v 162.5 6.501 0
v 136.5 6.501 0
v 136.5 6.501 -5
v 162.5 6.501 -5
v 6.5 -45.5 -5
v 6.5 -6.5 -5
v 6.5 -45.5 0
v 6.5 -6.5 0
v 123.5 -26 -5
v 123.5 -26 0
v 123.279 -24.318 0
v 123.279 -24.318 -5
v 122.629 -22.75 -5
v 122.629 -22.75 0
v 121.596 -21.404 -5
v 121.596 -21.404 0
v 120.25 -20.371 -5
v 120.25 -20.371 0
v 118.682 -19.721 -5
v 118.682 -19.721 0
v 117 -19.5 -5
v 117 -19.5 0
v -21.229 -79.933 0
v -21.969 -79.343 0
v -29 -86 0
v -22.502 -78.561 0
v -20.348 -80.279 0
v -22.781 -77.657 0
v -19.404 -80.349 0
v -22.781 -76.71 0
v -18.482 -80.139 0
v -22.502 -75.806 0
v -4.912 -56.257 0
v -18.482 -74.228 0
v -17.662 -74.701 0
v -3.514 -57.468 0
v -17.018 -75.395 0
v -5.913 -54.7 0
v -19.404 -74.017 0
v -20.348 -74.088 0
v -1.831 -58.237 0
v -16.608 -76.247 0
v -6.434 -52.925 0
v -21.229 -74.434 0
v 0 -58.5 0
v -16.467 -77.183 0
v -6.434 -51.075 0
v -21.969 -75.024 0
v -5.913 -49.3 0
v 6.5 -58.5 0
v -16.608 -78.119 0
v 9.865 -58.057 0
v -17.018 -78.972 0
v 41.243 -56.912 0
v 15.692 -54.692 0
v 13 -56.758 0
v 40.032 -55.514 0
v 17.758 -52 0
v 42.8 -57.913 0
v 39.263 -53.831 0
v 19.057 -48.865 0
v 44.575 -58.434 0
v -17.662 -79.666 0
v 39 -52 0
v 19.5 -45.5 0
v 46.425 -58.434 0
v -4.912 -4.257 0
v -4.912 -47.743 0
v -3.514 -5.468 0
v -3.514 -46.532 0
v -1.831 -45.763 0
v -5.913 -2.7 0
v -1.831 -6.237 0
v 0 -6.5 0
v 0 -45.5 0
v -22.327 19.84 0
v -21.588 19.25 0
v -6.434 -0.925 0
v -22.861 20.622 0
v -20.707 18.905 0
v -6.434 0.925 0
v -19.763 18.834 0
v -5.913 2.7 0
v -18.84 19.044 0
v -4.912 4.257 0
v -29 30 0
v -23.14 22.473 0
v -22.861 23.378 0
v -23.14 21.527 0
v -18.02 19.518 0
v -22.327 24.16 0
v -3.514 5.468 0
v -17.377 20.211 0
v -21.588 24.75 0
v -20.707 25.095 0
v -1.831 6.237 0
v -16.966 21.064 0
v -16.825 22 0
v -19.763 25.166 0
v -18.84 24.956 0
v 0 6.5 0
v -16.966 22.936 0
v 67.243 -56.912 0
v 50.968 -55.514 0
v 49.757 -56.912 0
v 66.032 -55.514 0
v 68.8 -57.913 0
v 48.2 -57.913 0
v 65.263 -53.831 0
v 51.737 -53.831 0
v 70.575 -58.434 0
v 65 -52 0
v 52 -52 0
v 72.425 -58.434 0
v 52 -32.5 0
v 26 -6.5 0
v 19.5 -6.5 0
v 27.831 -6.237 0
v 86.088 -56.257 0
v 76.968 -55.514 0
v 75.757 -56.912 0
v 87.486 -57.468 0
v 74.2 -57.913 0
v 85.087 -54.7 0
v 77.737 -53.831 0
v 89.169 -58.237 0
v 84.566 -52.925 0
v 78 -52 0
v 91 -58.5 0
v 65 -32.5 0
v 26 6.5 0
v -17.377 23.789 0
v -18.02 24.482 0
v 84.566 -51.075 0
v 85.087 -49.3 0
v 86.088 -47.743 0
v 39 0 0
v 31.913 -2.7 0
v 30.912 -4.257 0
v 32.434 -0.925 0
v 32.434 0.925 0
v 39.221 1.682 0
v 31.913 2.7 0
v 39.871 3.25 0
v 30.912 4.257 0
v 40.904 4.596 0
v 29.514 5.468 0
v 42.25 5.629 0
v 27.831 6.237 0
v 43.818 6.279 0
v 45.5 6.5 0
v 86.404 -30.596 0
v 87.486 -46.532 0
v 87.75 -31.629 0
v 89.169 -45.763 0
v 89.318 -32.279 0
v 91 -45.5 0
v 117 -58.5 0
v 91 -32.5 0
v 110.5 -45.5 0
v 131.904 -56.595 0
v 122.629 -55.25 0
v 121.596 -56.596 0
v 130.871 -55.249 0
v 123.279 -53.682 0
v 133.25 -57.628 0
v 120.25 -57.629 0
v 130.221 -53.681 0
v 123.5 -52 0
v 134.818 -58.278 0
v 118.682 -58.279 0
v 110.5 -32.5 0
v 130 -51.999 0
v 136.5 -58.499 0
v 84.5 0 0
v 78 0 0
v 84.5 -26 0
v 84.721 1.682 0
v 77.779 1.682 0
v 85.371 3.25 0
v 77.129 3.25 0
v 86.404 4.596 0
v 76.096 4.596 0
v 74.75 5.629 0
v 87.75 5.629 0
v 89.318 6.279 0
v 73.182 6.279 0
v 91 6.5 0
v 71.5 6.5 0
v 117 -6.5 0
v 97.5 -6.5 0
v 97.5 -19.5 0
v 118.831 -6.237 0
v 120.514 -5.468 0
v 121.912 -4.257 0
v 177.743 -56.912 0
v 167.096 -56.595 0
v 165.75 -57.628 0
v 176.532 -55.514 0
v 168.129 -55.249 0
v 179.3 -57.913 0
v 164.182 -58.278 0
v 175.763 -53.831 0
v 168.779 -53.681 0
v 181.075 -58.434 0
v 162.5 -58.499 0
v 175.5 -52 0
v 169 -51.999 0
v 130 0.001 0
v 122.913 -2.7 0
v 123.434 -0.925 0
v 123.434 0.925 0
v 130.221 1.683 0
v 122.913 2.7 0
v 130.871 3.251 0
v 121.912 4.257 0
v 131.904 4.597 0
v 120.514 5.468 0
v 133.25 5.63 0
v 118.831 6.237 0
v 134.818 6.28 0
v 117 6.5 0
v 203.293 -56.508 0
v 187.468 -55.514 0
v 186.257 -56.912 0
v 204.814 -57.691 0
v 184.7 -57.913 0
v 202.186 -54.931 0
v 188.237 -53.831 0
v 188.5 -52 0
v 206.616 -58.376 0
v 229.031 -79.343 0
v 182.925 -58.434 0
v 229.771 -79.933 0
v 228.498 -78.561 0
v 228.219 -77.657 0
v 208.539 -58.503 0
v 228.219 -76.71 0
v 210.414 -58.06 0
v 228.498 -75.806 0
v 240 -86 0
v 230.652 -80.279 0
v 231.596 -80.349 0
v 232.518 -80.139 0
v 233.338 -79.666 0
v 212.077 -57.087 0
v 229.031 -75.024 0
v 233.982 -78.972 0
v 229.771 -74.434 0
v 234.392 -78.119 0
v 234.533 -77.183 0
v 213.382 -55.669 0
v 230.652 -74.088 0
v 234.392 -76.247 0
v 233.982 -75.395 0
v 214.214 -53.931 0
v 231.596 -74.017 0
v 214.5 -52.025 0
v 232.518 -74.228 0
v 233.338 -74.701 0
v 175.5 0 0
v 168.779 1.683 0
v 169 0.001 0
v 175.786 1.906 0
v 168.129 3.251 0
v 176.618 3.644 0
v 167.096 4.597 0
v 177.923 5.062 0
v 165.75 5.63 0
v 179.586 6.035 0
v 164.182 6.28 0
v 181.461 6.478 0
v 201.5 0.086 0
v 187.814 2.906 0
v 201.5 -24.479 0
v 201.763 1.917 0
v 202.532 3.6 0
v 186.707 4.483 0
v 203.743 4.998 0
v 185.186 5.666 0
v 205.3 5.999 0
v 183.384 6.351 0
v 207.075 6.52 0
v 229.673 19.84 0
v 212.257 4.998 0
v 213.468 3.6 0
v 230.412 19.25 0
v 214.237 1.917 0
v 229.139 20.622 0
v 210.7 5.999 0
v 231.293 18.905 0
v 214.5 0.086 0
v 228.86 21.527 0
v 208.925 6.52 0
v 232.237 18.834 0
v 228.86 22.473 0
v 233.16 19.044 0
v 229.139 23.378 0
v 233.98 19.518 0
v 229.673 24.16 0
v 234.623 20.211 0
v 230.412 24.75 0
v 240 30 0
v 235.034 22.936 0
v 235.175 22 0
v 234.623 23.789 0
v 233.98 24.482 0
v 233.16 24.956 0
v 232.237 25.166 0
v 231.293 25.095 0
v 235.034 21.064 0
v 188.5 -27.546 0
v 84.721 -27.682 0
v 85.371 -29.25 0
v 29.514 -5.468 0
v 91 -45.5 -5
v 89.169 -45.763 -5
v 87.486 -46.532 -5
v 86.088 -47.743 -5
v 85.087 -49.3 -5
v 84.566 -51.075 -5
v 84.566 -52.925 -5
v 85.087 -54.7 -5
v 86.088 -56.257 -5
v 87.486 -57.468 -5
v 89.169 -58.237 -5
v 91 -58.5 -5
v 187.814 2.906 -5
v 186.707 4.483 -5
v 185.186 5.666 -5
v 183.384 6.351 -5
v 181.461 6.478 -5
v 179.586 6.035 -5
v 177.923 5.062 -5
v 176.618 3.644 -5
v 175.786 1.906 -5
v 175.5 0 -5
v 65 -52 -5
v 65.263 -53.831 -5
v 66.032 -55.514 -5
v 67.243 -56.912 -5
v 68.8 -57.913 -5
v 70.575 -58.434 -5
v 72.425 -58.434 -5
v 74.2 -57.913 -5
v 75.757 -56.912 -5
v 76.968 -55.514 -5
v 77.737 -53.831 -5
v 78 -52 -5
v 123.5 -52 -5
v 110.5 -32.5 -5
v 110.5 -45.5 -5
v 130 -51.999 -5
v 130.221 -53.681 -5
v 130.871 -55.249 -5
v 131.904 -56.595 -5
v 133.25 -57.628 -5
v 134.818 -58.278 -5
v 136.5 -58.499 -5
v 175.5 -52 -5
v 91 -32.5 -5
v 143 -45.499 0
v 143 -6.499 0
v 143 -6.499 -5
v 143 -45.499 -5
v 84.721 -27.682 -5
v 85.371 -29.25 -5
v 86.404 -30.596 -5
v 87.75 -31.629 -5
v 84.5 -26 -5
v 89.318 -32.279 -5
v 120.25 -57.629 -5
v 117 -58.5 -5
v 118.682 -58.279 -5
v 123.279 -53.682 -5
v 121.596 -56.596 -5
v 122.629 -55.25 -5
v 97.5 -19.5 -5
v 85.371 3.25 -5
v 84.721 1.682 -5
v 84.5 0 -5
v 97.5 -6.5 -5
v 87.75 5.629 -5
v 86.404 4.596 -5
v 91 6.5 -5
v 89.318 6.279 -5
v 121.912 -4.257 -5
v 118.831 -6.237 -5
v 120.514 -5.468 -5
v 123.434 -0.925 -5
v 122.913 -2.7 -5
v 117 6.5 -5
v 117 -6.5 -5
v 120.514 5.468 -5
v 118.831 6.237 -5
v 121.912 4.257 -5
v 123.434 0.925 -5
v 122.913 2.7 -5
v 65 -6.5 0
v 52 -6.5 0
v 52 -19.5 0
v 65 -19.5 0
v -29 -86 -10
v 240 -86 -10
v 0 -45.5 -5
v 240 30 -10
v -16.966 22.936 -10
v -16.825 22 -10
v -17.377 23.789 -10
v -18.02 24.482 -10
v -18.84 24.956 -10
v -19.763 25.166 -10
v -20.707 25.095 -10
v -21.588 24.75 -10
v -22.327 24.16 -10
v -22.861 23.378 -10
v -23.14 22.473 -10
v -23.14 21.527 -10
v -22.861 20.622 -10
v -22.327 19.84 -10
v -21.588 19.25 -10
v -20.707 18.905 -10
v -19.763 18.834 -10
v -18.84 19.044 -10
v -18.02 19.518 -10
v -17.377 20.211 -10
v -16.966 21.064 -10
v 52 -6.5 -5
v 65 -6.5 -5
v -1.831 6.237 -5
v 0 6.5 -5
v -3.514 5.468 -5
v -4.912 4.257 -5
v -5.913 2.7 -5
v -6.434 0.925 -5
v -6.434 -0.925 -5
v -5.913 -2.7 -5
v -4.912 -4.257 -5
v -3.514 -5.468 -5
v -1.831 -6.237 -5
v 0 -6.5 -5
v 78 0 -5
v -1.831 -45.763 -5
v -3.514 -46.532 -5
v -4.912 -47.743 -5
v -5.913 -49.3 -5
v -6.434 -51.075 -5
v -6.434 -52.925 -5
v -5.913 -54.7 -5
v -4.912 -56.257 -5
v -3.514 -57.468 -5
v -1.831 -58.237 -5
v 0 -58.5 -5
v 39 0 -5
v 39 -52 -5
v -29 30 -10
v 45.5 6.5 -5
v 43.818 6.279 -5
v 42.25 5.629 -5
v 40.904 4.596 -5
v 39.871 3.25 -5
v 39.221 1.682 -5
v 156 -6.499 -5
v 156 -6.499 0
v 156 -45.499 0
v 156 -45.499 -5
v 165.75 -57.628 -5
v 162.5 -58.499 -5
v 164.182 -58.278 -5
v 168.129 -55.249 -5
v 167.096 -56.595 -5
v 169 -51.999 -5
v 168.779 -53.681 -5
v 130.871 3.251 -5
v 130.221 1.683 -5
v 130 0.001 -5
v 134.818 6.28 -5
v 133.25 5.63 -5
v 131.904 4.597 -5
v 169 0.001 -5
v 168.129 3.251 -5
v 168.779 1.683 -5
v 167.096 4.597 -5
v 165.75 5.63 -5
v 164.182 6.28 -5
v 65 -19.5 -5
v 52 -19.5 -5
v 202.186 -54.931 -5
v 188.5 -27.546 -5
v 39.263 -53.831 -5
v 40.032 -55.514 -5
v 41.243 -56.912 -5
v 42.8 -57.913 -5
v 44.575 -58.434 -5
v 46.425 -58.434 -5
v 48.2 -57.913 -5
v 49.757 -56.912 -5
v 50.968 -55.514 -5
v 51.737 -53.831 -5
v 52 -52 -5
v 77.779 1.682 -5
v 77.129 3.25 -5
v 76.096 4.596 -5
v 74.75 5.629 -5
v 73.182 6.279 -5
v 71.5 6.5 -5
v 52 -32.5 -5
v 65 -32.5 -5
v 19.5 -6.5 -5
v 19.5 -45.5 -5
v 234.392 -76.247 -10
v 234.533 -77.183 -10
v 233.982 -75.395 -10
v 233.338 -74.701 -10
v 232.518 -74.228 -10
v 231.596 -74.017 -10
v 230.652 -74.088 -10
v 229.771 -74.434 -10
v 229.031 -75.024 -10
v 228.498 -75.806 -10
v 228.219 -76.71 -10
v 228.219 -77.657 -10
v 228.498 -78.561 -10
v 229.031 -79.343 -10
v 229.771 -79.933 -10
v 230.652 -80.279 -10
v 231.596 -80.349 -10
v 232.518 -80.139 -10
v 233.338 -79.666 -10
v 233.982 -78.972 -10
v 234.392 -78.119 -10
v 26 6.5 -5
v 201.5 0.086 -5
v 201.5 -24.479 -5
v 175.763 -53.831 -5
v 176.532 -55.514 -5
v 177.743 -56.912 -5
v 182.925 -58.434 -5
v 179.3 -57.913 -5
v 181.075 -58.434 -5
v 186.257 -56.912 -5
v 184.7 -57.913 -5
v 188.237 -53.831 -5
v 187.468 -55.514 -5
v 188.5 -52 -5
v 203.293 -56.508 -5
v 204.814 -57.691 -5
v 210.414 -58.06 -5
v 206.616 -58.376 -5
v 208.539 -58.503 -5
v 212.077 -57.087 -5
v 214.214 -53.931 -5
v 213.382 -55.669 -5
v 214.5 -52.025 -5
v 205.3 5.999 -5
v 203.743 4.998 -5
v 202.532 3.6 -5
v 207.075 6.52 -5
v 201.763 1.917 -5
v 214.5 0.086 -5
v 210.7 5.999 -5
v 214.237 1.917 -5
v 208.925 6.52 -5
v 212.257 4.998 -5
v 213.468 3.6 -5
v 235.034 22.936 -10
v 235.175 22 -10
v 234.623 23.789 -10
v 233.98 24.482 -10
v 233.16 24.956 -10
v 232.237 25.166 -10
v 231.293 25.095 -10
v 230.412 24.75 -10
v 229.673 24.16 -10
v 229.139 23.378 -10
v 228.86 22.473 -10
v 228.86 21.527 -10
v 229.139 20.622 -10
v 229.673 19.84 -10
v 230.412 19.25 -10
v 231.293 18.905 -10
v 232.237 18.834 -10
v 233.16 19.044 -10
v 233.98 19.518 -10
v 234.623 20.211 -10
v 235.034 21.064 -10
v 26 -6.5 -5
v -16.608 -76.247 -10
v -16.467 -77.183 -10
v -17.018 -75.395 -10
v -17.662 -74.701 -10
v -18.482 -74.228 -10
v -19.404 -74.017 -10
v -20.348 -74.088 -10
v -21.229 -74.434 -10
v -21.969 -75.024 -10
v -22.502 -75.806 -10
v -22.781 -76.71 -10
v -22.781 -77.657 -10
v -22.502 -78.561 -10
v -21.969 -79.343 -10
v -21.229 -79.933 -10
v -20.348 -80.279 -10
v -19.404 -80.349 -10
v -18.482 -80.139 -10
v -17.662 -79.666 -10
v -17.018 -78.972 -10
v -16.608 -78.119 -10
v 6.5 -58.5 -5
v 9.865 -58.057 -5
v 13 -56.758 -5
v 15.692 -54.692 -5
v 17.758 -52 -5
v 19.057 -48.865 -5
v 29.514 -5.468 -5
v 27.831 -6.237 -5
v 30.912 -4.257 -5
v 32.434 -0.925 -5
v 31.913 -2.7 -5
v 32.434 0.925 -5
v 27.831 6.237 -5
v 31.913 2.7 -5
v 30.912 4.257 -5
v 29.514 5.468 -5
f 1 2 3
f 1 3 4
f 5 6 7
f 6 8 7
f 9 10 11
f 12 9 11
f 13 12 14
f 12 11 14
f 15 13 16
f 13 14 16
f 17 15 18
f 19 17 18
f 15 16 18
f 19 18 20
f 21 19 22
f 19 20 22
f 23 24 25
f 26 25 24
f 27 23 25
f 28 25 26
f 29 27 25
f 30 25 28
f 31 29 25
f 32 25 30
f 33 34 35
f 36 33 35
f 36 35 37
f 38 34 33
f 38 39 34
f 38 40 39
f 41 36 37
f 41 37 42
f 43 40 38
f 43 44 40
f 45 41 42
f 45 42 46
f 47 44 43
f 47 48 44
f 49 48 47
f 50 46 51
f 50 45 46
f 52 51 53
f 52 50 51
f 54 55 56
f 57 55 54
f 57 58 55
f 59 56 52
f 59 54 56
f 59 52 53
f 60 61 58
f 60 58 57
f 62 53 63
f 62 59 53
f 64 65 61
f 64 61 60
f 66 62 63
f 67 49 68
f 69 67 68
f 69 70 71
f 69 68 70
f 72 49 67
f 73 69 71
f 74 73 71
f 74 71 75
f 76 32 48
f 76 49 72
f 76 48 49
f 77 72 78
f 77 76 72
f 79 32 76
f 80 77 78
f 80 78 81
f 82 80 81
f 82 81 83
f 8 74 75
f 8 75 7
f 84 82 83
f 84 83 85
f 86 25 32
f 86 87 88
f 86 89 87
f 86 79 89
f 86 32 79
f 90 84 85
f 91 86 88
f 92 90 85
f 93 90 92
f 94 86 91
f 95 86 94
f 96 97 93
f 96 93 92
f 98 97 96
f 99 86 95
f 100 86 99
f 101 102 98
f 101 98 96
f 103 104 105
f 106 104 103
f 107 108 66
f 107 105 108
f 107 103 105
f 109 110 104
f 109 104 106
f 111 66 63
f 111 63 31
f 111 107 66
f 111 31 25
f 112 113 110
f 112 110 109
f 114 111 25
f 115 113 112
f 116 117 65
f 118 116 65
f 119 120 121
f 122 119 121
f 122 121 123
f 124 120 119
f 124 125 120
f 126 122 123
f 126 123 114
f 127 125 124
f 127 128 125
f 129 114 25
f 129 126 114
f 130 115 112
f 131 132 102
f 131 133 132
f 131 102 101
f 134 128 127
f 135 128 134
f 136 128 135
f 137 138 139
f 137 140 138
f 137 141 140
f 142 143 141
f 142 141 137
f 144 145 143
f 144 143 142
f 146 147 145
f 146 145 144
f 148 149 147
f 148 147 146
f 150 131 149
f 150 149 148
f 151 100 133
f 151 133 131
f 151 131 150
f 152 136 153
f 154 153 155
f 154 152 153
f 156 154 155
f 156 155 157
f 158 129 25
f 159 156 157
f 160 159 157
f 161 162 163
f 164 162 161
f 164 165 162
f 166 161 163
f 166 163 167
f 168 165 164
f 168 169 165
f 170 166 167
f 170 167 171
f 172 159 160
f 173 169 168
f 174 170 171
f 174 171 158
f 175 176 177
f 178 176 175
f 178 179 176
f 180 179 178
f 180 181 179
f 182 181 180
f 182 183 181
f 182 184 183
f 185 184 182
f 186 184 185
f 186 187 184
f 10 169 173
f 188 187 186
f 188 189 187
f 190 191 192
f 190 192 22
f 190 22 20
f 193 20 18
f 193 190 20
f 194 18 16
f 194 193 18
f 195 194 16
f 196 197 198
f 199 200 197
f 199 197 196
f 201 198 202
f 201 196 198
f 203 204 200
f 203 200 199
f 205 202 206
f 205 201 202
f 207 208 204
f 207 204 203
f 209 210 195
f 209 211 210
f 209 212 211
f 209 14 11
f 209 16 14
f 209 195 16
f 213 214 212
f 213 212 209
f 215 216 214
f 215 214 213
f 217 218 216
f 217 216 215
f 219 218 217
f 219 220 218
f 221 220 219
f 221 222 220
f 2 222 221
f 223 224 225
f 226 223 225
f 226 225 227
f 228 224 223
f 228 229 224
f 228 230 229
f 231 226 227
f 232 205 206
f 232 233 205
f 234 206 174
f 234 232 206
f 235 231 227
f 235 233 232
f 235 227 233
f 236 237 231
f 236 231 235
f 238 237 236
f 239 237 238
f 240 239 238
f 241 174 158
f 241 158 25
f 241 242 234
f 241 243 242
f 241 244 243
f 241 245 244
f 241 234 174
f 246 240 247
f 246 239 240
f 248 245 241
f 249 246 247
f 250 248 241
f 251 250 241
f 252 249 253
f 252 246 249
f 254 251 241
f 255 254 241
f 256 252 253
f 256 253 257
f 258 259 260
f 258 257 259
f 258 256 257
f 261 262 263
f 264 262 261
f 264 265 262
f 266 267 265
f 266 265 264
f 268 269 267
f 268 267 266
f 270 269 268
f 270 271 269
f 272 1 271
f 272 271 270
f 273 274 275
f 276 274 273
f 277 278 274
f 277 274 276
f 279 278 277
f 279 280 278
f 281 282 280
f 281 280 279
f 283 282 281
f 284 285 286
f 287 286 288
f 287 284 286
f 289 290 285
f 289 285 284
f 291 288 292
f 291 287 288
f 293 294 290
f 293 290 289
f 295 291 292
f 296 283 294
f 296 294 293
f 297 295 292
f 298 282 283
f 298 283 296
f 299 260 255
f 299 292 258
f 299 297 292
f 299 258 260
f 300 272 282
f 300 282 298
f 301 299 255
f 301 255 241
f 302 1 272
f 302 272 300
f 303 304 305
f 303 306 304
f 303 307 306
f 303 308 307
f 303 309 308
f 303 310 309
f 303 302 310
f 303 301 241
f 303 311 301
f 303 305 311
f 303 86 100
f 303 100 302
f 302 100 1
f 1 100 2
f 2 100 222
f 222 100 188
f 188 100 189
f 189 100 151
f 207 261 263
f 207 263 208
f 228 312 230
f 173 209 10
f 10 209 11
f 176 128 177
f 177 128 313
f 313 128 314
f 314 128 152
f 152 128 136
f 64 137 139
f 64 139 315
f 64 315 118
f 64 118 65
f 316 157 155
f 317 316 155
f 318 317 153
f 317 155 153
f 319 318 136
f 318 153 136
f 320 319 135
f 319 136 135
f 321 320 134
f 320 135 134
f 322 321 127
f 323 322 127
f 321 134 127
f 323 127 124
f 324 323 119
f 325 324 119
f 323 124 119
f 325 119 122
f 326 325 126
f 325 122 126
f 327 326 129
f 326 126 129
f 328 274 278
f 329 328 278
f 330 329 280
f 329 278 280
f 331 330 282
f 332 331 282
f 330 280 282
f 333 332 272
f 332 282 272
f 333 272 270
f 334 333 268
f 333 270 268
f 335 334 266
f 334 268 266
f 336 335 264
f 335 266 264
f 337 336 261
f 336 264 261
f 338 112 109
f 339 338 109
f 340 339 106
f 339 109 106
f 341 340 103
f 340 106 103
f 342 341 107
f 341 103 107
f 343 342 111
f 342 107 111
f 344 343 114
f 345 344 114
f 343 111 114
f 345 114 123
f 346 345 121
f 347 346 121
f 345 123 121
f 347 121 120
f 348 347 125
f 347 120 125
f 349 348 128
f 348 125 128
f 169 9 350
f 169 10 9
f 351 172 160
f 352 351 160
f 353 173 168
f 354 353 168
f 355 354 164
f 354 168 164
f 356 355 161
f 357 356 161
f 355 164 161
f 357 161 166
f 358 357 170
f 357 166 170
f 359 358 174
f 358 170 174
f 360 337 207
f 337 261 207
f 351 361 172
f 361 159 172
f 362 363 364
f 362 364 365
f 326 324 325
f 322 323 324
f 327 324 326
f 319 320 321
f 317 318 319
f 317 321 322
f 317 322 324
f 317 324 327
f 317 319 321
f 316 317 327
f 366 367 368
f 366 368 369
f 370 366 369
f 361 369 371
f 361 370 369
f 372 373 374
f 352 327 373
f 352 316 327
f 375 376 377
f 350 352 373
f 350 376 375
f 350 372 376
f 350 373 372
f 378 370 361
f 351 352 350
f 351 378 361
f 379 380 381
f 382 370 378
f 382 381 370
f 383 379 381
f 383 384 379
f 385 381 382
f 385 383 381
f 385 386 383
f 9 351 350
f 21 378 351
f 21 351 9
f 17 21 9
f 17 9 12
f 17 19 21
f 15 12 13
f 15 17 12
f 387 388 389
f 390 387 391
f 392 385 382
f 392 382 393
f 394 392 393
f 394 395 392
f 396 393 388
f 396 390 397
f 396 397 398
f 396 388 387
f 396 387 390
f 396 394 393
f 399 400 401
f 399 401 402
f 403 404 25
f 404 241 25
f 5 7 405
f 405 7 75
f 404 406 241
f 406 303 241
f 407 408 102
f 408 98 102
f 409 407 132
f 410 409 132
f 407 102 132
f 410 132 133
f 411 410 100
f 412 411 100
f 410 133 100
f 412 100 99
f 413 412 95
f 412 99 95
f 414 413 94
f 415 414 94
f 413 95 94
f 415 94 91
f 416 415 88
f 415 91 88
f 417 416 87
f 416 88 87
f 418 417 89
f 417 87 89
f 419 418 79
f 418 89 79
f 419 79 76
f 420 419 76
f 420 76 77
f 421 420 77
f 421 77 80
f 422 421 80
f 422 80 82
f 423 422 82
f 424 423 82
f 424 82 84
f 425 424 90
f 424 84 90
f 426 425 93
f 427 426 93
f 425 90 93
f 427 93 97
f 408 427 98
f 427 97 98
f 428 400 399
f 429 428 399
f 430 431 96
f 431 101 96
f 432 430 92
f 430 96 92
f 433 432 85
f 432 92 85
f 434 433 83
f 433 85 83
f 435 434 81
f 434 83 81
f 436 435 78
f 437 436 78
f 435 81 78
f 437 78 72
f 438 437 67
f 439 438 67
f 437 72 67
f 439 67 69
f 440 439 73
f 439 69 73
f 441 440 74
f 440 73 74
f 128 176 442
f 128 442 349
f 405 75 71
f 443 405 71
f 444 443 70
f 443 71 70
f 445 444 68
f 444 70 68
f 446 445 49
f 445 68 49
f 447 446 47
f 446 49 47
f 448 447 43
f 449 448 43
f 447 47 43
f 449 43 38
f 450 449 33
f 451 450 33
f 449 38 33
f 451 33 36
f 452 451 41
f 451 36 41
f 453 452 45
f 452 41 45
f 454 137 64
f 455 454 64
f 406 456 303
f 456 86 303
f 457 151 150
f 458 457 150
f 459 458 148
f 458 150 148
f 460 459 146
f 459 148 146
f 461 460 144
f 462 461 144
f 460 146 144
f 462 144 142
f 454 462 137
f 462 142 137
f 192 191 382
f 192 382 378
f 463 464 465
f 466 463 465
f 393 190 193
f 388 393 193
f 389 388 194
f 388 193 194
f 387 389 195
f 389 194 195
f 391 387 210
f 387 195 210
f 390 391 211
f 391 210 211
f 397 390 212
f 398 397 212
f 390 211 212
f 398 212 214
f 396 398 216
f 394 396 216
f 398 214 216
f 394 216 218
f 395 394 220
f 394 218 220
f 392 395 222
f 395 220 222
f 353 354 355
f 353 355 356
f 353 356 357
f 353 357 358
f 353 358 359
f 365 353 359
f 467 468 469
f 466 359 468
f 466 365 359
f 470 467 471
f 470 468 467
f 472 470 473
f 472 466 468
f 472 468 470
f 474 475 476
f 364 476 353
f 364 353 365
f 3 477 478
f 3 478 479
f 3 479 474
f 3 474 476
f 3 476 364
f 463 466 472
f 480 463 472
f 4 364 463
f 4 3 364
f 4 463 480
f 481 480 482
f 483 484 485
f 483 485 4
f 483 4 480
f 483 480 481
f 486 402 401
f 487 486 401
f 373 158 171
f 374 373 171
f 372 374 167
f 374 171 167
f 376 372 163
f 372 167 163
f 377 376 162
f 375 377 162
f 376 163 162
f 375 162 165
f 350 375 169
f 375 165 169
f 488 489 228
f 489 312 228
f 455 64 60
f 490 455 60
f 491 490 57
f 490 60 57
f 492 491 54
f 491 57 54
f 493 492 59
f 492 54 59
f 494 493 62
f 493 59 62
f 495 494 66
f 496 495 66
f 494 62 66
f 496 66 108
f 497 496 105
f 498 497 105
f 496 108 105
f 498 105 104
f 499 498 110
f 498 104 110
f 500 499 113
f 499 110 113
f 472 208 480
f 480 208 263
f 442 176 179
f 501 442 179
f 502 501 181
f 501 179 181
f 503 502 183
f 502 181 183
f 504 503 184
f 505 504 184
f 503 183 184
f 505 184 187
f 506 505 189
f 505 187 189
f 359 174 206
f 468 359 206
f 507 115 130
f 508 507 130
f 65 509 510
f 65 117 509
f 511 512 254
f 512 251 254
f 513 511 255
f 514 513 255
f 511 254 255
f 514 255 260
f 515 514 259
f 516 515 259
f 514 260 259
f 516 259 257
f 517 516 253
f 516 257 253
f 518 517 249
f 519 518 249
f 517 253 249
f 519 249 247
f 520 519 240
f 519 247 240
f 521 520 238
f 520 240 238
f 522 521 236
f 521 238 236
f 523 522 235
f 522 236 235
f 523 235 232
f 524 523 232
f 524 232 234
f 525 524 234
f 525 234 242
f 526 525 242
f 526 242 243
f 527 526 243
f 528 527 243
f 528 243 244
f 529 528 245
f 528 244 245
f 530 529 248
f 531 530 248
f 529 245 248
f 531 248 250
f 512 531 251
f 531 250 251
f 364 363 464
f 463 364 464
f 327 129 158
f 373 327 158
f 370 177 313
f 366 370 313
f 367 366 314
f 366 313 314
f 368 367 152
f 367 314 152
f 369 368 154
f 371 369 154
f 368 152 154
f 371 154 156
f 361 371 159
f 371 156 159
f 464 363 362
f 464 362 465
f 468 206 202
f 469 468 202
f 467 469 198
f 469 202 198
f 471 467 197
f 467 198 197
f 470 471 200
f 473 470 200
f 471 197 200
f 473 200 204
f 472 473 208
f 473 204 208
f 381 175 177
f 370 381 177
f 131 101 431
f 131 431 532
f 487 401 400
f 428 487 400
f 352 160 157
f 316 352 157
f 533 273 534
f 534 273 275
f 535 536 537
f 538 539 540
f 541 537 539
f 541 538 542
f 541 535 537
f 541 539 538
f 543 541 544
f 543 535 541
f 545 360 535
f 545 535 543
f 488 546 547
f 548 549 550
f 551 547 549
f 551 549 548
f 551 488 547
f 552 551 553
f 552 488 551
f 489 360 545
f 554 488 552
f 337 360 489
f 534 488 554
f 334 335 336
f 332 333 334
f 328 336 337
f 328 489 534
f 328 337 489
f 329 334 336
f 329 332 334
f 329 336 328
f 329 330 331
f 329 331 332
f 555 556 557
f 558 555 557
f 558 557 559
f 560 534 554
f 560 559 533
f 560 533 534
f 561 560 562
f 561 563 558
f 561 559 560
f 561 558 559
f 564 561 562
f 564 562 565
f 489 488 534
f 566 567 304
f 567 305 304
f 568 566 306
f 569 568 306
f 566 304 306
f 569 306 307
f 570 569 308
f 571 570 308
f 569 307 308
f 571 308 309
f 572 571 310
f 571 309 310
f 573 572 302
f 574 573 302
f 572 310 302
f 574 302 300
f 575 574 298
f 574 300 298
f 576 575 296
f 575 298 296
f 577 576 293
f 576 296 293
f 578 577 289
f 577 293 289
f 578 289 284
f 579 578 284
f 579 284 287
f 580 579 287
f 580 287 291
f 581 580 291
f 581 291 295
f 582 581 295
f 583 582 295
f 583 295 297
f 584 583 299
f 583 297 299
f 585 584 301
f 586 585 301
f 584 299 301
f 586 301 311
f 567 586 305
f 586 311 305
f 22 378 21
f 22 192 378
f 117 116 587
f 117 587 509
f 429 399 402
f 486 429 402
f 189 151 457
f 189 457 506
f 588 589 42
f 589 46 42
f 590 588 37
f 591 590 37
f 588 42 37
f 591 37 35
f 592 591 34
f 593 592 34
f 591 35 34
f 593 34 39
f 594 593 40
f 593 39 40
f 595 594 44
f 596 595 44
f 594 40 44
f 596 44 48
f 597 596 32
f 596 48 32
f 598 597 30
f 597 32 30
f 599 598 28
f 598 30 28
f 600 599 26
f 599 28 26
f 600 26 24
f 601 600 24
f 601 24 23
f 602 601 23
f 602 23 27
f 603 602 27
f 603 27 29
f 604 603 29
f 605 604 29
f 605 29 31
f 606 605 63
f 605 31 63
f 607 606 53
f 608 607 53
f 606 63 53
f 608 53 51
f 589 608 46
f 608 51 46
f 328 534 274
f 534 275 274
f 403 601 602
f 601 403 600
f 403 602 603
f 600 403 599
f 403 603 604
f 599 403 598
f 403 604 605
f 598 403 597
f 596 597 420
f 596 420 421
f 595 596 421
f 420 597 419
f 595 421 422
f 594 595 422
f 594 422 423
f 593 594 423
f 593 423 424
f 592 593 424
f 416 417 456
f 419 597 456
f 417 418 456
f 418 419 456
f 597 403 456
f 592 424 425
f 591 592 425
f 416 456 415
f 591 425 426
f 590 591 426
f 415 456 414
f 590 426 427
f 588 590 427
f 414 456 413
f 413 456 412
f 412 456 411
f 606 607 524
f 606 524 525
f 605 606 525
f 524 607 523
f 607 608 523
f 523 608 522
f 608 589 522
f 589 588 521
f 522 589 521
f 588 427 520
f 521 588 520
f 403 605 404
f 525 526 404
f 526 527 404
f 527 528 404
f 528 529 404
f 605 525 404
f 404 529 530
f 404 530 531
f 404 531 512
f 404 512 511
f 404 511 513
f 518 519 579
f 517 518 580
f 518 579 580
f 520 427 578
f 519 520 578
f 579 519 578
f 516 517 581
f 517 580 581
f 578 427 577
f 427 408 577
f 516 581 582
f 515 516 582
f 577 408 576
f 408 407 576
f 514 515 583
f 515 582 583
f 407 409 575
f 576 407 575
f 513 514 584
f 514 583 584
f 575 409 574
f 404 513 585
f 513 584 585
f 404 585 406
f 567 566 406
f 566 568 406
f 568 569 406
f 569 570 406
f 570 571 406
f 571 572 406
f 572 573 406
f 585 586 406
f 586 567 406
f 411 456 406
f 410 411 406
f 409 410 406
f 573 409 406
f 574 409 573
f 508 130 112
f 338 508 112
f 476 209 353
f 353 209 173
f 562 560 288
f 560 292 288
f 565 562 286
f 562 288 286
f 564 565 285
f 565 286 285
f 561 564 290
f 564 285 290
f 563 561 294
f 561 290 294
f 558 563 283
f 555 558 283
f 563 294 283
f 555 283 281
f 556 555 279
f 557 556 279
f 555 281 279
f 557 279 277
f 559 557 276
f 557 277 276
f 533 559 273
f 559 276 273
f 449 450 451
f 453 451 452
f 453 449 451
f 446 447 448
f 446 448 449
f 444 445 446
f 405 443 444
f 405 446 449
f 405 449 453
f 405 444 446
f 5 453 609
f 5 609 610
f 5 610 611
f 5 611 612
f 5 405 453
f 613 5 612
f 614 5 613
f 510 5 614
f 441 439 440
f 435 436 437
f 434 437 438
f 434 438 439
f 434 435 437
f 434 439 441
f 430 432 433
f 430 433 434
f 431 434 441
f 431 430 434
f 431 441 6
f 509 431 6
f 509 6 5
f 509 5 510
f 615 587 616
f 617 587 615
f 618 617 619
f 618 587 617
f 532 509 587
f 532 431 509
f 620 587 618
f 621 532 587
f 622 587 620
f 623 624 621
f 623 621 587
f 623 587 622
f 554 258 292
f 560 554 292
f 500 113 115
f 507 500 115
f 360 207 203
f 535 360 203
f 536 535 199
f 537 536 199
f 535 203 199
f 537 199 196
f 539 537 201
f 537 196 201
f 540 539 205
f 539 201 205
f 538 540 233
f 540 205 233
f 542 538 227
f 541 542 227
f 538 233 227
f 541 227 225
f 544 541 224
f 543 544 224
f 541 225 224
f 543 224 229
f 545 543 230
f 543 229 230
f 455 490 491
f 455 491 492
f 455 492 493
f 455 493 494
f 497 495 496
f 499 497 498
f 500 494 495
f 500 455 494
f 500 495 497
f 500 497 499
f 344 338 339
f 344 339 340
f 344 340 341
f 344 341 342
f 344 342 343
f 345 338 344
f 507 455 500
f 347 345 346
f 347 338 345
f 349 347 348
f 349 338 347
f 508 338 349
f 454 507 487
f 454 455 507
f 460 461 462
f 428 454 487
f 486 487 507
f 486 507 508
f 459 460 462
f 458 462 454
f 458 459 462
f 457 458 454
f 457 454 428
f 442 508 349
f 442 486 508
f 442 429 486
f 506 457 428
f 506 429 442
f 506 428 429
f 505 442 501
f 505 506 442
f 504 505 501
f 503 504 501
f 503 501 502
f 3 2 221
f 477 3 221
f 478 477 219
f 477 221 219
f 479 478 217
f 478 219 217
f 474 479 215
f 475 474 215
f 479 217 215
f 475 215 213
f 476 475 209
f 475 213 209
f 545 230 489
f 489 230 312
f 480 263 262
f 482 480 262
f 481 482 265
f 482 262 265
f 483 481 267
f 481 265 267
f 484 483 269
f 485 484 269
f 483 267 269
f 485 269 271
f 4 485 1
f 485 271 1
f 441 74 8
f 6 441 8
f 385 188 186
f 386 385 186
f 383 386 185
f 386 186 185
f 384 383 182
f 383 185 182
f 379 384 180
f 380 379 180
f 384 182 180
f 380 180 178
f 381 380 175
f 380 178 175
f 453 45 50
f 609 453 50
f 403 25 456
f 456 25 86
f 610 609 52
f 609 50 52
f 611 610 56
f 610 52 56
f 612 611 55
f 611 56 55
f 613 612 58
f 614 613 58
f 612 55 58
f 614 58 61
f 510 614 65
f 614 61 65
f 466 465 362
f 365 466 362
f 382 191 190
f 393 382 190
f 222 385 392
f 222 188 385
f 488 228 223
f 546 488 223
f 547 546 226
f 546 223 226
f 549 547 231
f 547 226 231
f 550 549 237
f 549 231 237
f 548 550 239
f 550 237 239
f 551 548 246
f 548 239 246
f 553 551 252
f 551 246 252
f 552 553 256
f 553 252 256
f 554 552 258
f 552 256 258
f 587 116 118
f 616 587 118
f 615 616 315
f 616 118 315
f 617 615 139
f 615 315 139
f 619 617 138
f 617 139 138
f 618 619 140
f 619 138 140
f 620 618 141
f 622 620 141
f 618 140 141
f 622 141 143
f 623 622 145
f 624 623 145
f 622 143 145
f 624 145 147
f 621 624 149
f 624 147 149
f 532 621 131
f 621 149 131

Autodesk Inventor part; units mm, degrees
ref_plane "YZ Plane" through (0, 0, 0) normal (1, 0, 0) x (0, 1, 0)
ref_plane "XZ Plane" through (0, 0, 0) normal (0, 1, 0) x (-1, 0, 0)
ref_plane "XY Plane" through (0, 0, 0) normal (0, 0, 1) x (1, 0, 0)
sketch "Sketch1" plane through (0, 0, 0) normal (0, 0, 1) x (1, 0, 0)
  arc A0 (0, 6.5) -> (0, -6.5) centre (0, 0) ccw
  line L0 (0, 6.5) -> (26, 6.5)
  line L1 (0, -6.5) -> (6.5, -6.5)
  arc A1 (26, -6.5) -> (26, 6.5) centre (26, 0) ccw
  line L2 (26, -6.5) -> (19.5, -6.5)
  line L3 (6.5, -6.5) -> (6.5, -45.5)
  line L4 (19.5, -6.5) -> (19.5, -45.5)
  line L5 (6.5, -45.5) -> (0, -45.5)
  arc A2 (0, -45.5) -> (0, -58.5) centre (0, -52) ccw
  line L6 (0, -58.5) -> (6.5, -58.5)
  arc A3 (6.5, -58.5) -> (19.5, -45.5) centre (6.5, -45.5) ccw
  line L7 (39, 0) -> (39, -52)
  arc A4 (39, -52) -> (52, -52) centre (45.5, -52) ccw
  line L8 (52, -52) -> (52, -32.5)
  line L9 (52, -32.5) -> (65, -32.5)
  line L10 (52, -6.5) -> (65, -6.5)
  line L11 (65, -6.5) -> (65, -19.5)
  line L12 (65, -19.5) -> (52, -19.5)
  line L13 (52, -19.5) -> (52, -6.5)
  line L14 (45.5, 6.5) -> (71.5, 6.5)
  line L15 (78, 0) -> (78, -52)
  line L16 (65, -32.5) -> (65, -52)
  arc A5 (65, -52) -> (78, -52) centre (71.5, -52) ccw
  arc A6 (45.5, 6.5) -> (39, 0) centre (45.5, 0) ccw
  arc A7 (78, 0) -> (71.5, 6.5) centre (71.5, 0) ccw
  line L17 (84.5, 0) -> (84.5, -26)
  arc A8 (91, 6.5) -> (84.5, 0) centre (91, 0) ccw
  line L18 (91, 6.5) -> (117, 6.5)
  line L19 (91, -32.5) -> (110.5, -32.5)
  arc A9 (84.5, -26) -> (91, -32.5) centre (91, -26) ccw
  line L20 (97.5, -6.5) -> (97.5, -19.5)
  line L21 (97.5, -6.5) -> (117, -6.5)
  arc A10 (117, -6.5) -> (117, 6.5) centre (117, 0) ccw
  line L22 (97.5, -19.5) -> (117, -19.5)
  arc A11 (123.5, -26) -> (117, -19.5) centre (117, -26) ccw
  line L23 (123.5, -26) -> (123.5, -52)
  line L24 (110.5, -32.5) -> (110.5, -45.5)
  line L25 (110.5, -45.5) -> (91, -45.5)
  arc A12 (91, -45.5) -> (91, -58.5) centre (91, -52) ccw
  arc A13 (117, -58.5) -> (123.5, -52) centre (117, -52) ccw
  line L26 (91, -58.5) -> (117, -58.5)
  line L27 (130, 0.001) -> (130, -51.999)
  line L28 (143, -6.499) -> (143, -45.499)
  line L29 (143, -6.499) -> (156, -6.499)
  line L30 (156, -6.499) -> (156, -45.499)
  line L31 (156, -45.499) -> (143, -45.499)
  arc A14 (136.5, 6.501) -> (130, 0.001) centre (136.5, 0.001) ccw
  line L32 (136.5, 6.501) -> (162.5, 6.501)
  line L33 (136.5, -58.499) -> (162.5, -58.499)
  arc A15 (162.5, -58.499) -> (169, -51.999) centre (162.5, -51.999) ccw
  line L34 (169, -51.999) -> (169, 0.001)
  arc A16 (169, 0.001) -> (162.5, 6.501) centre (162.5, 0.001) ccw
  line L35 (175.5, 0) -> (175.5, -52)
  arc A17 (175.524, -51.4421) -> (188.5, -52) centre (182, -52) ccw
  line L36 (214.5, -52.025) -> (214.5, 0.086)
  line L37 (188.5, -52) -> (188.5, -27.5463)
  line L38 (188.5, -27.5463) -> (202.1857, -54.9308)
  line L39 (201.5, 0.086) -> (201.5, -24.4787)
  line L40 (201.5, -24.4787) -> (187.8143, 2.9058)
  arc A18 (214.5, 0.086) -> (201.5, 0.086) centre (208, 0.086) ccw
  arc A19 (130, -51.9852) -> (136.5, -58.499) centre (136.5, -51.999) ccw
  arc A20 (202.1857, -54.9308) -> (214.5, -52.025) centre (208, -52.025) ccw
  arc A21 (187.8143, 2.9058) -> (175.5, 0) centre (182, 0) ccw
  point P0 (0, 0)
  dimension "d2" = 26
  dimension "d3" = 6.5
  dimension "d4" = 13
  dimension "d11" = 13
  dimension "d12" = 6.5
  dimension "d13" = 13
  dimension "d16" = 39
  dimension "d17" = 39
  dimension "d18" = 6.5
  dimension "d19" = 52
  dimension "d20" = 6.5
  dimension "d22" = 13
  dimension "d23" = 19.5
  dimension "d24" = 13
  dimension "d29" = 13
  dimension "d30" = 13
  dimension "d31" = 13
  dimension "d32" = 13
  dimension "d35" = 26
  dimension "d36" = 52
  dimension "d37" = 13
  dimension "d38" = 6.5
  dimension "d39" = 6.5
  dimension "d46" = 19.5
  dimension "d49" = 6.5
  dimension "d50" = 6.5
  dimension "d51" = 90
  dimension "d52" = 6.5
  dimension "d53" = 26
  dimension "d54" = 6.5
  dimension "d55" = 26
  dimension "d56" = 19.5
  dimension "d57" = 39
  dimension "d58" = 13
  dimension "d59" = 13
  dimension "d60" = 19.5
  dimension "d61" = 13
  dimension "d62" = 19.5
  dimension "d63" = 26
  dimension "d64" = 13
  dimension "d65" = 39
  dimension "d66" = 13
  dimension "d67" = 52
  dimension "d68" = 6.5
  dimension "d69" = 39
  dimension "d70" = 13
  dimension "d71" = 39
  dimension "d72" = 13
  dimension "d73" = 13
  dimension "d74" = 6.5
  dimension "d75" = 90
  dimension "d76" = 26
  dimension "d77" = 13
  dimension "d78" = 6.5
  dimension "d79" = 6.5
  dimension "d84" = 13
  dimension "d86" = 26
  dimension "d87" = 13
  dimension "d89" = 52
  dimension "d90" = 13
  dimension "d93" = 6.5
  dimension "d94" = 6.5
  dimension "d95" = 6.5
  dimension "d96" = 6.5
sketch "Sketch2" plane through (0, 0, 0) normal (0, 0, 1) x (1, 0, 0)
  circle A0 centre (231.3583, -77.1833) radius 3.175
  circle A1 centre (-20, 22) radius 3.175
  circle A2 centre (232, 22) radius 3.175
  circle A3 centre (-19.6417, -77.1833) radius 3.175
  line L0 (-29, 30) -> (240, 30)
  line L1 (240, 30) -> (240, -86)
  line L2 (240, -86) -> (-29, -86)
  line L3 (-29, -86) -> (-29, 30)
  point P0 (0, 0)
  dimension "d99" = 6.35
  dimension "d100" = 6.35
  dimension "d101" = 6.35
  dimension "d102" = 6.35
  dimension "d107" = 269
  dimension "d108" = 116
extrude "Extrusion1" add sketch "Sketch2" against normal blind 10
extrude "Extrusion2" cut sketch "Sketch1" against normal blind 5
properties part number "JASON" material "Polyethylene, High Density"
